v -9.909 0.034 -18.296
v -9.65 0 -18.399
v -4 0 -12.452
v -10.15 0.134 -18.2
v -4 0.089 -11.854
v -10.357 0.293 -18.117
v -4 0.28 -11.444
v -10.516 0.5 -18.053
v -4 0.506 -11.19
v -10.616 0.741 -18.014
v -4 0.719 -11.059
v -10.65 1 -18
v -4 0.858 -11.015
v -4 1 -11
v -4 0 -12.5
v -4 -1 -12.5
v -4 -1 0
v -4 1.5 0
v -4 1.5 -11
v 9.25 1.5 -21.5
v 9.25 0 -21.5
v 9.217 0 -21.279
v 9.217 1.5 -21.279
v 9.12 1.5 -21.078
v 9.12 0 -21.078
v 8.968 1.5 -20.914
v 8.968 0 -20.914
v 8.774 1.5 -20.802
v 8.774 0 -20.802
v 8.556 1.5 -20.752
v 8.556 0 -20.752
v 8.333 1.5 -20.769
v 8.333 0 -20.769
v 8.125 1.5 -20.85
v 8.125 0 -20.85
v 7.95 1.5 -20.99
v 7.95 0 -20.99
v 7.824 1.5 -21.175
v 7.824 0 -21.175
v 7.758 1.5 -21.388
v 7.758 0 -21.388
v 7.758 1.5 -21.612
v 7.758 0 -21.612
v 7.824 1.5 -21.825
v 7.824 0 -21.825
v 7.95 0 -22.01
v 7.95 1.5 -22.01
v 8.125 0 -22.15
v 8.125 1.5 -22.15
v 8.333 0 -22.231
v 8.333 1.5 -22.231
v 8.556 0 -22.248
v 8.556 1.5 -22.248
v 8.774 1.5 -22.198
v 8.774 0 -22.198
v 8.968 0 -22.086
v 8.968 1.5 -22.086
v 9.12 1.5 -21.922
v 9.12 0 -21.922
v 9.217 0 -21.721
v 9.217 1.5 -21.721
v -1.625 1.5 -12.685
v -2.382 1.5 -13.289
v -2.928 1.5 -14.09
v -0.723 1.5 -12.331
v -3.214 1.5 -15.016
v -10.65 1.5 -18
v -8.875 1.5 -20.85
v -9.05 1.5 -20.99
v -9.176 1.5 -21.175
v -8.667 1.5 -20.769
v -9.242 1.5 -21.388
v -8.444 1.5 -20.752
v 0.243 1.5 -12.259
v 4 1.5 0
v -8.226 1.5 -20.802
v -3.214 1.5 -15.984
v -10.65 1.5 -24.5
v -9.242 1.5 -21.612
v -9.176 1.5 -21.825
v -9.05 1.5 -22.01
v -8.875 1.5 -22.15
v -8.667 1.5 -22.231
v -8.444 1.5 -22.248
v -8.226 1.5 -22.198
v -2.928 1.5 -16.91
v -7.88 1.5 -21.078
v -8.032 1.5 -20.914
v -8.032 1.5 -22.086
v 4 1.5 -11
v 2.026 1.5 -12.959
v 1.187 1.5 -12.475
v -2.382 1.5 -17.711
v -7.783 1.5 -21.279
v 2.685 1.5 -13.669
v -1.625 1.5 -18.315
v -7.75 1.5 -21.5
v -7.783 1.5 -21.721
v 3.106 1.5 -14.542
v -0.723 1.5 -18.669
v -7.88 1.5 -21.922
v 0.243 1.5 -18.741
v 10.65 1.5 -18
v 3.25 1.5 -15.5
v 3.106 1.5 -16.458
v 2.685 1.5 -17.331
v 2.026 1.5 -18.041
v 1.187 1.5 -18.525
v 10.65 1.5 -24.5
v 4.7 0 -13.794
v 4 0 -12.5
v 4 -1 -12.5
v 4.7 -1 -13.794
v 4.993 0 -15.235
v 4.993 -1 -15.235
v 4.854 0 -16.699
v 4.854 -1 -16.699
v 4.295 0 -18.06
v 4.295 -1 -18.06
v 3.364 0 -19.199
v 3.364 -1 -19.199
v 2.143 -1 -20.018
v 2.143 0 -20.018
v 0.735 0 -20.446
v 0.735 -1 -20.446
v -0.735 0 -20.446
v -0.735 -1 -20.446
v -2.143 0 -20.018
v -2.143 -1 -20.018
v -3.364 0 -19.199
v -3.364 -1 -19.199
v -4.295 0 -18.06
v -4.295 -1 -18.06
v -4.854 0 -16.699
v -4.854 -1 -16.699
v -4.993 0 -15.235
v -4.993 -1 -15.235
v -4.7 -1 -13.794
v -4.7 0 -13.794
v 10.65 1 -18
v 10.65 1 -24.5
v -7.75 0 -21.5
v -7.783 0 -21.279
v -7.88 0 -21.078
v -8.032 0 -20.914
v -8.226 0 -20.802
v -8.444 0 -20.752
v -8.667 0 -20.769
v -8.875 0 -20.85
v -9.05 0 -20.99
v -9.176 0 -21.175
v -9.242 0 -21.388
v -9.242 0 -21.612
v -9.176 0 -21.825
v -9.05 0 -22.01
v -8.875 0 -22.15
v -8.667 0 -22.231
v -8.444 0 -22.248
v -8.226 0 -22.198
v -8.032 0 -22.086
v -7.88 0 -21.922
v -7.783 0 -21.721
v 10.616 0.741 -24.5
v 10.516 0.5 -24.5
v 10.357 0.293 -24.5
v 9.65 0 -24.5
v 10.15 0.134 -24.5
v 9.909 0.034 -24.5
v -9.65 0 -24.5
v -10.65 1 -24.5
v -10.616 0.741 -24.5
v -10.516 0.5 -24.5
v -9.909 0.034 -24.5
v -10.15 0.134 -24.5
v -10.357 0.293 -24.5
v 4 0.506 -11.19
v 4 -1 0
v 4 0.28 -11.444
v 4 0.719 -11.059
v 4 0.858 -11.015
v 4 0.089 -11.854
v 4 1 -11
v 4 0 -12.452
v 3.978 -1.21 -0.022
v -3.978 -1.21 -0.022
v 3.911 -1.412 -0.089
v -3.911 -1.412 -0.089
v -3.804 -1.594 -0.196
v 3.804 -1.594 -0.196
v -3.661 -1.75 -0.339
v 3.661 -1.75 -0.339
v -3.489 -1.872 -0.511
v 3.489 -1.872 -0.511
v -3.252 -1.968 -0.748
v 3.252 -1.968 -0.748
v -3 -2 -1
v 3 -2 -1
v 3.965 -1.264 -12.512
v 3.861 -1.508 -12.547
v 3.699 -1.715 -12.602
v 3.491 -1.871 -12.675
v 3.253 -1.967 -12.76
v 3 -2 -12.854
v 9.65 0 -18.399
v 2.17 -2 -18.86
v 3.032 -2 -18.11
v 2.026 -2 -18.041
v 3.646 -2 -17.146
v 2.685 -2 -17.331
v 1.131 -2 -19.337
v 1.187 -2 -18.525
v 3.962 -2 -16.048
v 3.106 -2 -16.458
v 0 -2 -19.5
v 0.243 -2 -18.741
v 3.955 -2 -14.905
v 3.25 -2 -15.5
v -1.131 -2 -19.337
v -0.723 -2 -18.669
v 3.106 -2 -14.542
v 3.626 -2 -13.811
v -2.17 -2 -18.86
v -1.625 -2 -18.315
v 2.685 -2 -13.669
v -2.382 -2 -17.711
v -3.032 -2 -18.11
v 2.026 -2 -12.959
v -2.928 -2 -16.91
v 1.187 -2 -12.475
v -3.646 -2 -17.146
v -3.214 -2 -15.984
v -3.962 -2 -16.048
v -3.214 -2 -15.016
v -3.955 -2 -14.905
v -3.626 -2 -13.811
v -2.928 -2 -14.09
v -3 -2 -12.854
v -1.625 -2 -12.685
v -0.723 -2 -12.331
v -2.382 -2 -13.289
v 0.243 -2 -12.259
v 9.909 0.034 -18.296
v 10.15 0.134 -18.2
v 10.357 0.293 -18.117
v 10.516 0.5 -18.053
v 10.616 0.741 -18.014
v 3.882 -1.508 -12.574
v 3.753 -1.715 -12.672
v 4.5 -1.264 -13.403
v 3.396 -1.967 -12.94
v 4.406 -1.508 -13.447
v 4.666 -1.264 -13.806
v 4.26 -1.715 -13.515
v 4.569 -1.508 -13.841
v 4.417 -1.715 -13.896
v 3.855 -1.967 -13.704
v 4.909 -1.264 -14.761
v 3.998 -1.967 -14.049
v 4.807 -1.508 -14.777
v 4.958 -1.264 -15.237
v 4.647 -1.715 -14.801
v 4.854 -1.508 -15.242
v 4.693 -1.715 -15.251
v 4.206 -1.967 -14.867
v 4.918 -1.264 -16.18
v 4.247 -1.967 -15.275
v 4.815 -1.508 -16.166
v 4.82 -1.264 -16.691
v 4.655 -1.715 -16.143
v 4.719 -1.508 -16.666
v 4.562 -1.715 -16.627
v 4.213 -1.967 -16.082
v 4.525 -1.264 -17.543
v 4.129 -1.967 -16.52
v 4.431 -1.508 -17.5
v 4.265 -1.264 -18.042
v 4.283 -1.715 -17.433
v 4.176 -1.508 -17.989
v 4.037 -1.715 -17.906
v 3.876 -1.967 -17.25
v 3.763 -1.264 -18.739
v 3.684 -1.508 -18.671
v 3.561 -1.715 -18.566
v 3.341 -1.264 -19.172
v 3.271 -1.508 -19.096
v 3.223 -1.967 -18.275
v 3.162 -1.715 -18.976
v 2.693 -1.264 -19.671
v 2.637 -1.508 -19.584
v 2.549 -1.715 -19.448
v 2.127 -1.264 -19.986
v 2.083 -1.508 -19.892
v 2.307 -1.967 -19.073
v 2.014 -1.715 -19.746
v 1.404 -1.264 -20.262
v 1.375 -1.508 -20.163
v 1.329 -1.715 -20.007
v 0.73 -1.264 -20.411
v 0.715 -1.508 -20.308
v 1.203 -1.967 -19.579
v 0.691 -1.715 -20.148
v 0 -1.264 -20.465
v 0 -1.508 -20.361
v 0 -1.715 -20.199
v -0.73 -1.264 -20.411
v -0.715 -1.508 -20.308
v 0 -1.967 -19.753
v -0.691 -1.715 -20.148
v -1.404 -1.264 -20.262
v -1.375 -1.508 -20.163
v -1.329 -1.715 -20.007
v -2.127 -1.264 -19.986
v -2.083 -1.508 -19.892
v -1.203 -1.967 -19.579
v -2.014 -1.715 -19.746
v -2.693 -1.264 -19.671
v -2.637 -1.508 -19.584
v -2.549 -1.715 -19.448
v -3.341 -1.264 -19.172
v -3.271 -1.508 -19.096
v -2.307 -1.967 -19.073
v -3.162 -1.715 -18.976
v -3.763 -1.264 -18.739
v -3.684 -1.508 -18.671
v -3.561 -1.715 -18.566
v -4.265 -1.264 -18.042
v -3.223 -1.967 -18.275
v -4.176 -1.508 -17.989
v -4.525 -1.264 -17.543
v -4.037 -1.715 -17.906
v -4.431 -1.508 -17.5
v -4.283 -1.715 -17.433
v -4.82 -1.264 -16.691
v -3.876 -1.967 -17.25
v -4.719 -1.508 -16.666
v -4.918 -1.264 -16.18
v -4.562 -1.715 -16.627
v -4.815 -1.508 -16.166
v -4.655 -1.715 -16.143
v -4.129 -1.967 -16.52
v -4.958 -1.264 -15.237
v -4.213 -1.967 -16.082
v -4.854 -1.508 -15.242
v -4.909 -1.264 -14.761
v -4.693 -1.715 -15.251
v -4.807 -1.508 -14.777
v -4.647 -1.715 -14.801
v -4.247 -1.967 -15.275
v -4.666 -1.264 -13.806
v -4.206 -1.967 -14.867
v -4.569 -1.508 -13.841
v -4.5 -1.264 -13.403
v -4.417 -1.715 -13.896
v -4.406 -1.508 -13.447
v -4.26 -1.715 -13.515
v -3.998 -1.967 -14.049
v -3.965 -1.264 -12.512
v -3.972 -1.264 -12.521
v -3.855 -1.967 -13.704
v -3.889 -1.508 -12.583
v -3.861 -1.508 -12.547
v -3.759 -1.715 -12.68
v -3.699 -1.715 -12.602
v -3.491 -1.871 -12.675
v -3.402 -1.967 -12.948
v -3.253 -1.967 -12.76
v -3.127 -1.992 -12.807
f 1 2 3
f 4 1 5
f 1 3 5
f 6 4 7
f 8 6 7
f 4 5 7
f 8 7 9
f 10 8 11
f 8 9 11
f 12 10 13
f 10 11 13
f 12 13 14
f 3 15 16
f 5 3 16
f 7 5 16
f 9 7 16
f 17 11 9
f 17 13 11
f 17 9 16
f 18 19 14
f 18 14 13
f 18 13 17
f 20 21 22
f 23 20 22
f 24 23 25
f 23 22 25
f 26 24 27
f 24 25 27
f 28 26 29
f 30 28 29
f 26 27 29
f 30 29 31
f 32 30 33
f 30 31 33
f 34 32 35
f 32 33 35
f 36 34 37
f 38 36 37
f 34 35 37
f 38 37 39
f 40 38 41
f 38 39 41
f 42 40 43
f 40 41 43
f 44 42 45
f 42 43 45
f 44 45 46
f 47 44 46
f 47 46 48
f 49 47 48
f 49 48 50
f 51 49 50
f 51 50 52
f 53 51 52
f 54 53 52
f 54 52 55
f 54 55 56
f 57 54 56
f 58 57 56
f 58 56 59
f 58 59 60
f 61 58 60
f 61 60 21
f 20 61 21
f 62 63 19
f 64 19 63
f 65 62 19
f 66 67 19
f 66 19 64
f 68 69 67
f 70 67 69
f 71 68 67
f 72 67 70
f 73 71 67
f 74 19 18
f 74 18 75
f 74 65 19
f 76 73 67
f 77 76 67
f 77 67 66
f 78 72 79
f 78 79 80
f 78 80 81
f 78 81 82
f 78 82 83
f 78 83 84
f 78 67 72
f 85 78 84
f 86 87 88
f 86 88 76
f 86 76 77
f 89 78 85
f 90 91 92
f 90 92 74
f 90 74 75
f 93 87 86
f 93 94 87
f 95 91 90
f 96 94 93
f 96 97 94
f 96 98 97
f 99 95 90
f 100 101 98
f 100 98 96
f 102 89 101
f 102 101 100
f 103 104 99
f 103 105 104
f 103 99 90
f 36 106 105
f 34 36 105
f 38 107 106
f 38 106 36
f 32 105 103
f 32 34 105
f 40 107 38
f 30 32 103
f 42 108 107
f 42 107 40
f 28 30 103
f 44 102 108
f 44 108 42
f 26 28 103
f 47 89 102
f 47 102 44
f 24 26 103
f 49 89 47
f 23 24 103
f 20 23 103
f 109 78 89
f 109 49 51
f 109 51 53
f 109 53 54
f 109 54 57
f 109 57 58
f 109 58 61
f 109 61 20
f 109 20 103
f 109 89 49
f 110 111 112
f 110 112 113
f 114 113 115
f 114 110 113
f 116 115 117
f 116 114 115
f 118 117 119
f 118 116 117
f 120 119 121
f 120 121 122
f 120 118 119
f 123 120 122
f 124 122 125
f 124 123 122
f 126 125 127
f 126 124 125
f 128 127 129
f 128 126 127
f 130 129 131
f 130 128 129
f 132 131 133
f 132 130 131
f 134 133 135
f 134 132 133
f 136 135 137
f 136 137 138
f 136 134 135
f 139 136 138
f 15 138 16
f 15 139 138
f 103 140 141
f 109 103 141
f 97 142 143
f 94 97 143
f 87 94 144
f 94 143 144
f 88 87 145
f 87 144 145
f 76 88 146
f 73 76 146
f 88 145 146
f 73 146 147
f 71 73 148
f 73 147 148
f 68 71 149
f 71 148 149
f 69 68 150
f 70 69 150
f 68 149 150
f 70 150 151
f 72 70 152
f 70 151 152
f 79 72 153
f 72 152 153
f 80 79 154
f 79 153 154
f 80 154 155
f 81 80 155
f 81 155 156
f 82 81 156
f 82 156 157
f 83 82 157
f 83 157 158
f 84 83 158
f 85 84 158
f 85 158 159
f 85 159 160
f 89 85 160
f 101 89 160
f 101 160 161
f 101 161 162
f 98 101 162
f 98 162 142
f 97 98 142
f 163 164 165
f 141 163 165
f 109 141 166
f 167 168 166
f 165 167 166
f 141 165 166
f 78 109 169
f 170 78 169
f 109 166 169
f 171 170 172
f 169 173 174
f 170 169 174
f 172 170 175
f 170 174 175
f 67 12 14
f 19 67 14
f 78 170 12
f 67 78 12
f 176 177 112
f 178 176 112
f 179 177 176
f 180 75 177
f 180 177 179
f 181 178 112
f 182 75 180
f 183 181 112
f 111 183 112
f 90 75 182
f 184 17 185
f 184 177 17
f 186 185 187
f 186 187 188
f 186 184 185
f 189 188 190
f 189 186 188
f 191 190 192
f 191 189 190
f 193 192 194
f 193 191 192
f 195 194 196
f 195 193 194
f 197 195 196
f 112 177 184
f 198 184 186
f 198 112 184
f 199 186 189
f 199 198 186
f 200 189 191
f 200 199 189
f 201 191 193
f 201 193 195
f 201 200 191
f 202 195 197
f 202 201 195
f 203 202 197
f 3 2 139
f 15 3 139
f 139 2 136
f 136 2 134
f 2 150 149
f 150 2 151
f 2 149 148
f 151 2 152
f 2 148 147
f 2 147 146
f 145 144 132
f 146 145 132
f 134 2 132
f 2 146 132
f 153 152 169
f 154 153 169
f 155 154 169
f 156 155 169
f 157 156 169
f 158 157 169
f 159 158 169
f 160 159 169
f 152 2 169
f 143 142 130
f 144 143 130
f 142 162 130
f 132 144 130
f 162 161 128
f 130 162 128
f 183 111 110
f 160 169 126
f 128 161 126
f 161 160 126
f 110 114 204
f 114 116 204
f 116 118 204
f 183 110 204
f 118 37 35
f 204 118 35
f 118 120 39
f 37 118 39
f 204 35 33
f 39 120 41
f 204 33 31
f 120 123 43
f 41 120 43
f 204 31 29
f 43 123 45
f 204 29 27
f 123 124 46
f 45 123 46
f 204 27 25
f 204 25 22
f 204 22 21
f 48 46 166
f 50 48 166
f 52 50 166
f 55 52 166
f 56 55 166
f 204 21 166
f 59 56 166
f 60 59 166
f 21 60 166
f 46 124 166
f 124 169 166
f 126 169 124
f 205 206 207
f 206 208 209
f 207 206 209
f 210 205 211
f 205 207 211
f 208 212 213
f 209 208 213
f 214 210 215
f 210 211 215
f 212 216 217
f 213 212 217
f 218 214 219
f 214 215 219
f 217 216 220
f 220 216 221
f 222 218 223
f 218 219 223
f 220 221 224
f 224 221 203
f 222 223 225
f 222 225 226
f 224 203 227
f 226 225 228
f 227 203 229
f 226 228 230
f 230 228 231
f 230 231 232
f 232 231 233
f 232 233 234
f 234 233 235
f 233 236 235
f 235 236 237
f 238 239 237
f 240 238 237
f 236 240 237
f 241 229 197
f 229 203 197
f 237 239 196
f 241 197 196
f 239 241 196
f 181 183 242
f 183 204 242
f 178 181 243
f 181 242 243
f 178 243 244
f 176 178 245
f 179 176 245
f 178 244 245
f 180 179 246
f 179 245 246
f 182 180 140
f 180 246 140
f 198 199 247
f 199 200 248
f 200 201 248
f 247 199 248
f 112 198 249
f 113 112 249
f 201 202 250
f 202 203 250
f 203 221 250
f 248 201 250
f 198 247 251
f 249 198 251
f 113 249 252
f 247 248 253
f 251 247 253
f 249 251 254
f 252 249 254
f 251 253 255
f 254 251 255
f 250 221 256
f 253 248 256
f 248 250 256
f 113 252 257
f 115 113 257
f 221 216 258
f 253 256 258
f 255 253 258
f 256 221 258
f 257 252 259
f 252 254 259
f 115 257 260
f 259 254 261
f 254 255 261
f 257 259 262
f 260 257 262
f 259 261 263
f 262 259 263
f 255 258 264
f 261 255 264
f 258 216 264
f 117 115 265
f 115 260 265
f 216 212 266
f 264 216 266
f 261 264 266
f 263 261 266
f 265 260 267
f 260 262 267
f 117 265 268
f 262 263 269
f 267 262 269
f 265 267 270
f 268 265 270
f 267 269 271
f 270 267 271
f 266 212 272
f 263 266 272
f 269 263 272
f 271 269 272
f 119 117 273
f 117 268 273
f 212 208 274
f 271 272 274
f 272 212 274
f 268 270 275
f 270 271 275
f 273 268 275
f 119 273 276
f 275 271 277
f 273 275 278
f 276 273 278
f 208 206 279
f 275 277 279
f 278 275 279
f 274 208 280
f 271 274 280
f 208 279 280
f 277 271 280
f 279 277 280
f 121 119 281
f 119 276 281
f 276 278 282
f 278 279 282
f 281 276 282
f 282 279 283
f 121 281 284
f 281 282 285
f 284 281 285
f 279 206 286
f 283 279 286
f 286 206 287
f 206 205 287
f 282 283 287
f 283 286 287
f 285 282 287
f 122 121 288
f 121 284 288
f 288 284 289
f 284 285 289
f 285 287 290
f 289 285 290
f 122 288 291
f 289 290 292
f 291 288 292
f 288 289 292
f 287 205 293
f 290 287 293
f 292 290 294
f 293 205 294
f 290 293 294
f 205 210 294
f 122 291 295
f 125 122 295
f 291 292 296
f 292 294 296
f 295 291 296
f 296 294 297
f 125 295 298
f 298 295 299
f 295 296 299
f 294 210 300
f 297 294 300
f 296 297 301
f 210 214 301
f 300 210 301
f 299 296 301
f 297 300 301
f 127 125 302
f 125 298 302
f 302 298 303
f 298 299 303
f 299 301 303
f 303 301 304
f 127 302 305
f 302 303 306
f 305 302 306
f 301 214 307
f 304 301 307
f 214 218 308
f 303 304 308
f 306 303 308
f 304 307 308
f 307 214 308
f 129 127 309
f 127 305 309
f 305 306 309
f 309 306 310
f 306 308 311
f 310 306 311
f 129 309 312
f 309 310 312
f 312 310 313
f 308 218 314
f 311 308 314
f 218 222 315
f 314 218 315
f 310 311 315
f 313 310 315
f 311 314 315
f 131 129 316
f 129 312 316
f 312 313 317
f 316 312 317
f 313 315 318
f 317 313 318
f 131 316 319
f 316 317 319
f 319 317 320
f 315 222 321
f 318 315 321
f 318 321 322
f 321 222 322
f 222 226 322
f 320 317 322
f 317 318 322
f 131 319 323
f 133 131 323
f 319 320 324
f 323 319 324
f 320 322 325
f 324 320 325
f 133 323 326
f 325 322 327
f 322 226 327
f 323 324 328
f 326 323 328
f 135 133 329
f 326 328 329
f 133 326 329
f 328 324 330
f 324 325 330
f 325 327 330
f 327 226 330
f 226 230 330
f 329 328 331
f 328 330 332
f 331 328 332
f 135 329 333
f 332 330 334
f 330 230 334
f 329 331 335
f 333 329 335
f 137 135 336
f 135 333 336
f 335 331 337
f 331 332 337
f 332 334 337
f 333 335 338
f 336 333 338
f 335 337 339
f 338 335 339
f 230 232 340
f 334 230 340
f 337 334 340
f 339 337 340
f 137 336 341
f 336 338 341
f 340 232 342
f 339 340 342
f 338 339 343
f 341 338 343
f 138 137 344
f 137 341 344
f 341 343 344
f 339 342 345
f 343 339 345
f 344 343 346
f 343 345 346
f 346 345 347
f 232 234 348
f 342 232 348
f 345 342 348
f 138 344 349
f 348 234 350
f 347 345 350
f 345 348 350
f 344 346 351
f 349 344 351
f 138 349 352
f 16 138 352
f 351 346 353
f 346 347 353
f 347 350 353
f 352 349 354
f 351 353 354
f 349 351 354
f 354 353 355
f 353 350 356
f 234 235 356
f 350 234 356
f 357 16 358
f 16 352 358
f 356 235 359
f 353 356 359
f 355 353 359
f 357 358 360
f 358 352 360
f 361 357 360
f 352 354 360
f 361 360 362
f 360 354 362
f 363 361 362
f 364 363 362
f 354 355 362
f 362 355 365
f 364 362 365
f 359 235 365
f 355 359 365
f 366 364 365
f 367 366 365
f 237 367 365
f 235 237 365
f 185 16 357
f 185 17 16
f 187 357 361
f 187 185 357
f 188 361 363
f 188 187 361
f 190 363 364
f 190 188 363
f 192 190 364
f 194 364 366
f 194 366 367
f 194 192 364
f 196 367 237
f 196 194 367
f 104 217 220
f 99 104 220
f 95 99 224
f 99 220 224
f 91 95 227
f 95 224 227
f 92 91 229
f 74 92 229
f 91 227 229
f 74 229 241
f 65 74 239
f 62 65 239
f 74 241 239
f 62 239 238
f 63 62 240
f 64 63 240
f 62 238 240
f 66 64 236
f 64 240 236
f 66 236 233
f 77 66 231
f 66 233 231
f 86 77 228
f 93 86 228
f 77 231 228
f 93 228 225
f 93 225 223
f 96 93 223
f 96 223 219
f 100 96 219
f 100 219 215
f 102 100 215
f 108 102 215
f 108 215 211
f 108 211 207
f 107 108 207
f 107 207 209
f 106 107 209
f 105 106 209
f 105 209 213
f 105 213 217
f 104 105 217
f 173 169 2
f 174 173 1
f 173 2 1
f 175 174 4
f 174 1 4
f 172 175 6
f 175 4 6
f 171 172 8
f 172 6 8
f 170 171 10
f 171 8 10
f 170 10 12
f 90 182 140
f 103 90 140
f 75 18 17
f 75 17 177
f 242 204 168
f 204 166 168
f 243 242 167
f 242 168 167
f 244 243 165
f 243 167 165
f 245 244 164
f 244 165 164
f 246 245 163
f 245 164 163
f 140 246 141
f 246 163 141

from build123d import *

# Parameters (mm, degrees)
BOSS_EXTRUDE1_DEPTH = 1.5
BOSS_EXTRUDE2_DEPTH = 2
FILLET1_R           = 1
FILLET2_R           = 1
SKETCH3_R           = 3.25
CUT_EXTRUDE1_DEPTH  = 4.5
SKETCH4_R           = 0.75
CUT_EXTRUDE2_DEPTH  = 2.5


with BuildPart() as part:
    # Sketch1 → Boss-Extrude1 (new body)
    with BuildSketch(Plane(origin=(0, 0, 0), x_dir=(1, 0, 0), z_dir=(0, 1, 0))):
        Polygon((-10.65, 18), (-4, 11), (-4, 0), (4, 0), (4, 11), (10.65, 18), (10.65, 24.5), (-10.65, 24.5), align=None)
    extrude(amount=BOSS_EXTRUDE1_DEPTH)

    # Sketch2 → Boss-Extrude2 (add)
    with BuildSketch(Plane.XZ):
        with BuildLine():
            Line((4, 0), (4, -12.5))
            ThreePointArc((4, -12.5), (0, -20.5), (-4, -12.5))
            Line((-4, -12.5), (-4, 0))
            Line((-4, 0), (4, 0))
        make_face()
    extrude(amount=BOSS_EXTRUDE2_DEPTH)

    # Fillet1
    fillet1_edges = [part.edges().sort_by_distance(p)[0] for p in [
        (0, -2, 0),
        (-4, -2, -6.25),
        (0, -2, -20.5),
        (4, -2, -6.25),
    ]]
    fillet(fillet1_edges, radius=FILLET1_R)

    # Fillet2
    fillet2_edges = [part.edges().sort_by_distance(p)[0] for p in [
        (-7.325, 0, -14.5),
        (-10.65, 0, -21.25),
        (10.65, 0, -21.25),
        (7.325, 0, -14.5),
    ]]
    fillet(fillet2_edges, radius=FILLET2_R)

    # Sketch3 → Cut-Extrude1 (cut, through all)
    with BuildSketch(Plane.XZ.offset(2)):
        with Locations((0, -15.5)):
            Circle(SKETCH3_R)
    extrude(amount=-CUT_EXTRUDE1_DEPTH, mode=Mode.SUBTRACT)

    # Sketch4 → Cut-Extrude2 (cut, through all)
    with BuildSketch(Plane.XZ):
        with Locations((-8.5, -21.5)):
            Circle(SKETCH4_R)
        with Locations((8.5, -21.5)):
            Circle(SKETCH4_R)
    extrude(amount=-CUT_EXTRUDE2_DEPTH, mode=Mode.SUBTRACT)


solid = part.part
